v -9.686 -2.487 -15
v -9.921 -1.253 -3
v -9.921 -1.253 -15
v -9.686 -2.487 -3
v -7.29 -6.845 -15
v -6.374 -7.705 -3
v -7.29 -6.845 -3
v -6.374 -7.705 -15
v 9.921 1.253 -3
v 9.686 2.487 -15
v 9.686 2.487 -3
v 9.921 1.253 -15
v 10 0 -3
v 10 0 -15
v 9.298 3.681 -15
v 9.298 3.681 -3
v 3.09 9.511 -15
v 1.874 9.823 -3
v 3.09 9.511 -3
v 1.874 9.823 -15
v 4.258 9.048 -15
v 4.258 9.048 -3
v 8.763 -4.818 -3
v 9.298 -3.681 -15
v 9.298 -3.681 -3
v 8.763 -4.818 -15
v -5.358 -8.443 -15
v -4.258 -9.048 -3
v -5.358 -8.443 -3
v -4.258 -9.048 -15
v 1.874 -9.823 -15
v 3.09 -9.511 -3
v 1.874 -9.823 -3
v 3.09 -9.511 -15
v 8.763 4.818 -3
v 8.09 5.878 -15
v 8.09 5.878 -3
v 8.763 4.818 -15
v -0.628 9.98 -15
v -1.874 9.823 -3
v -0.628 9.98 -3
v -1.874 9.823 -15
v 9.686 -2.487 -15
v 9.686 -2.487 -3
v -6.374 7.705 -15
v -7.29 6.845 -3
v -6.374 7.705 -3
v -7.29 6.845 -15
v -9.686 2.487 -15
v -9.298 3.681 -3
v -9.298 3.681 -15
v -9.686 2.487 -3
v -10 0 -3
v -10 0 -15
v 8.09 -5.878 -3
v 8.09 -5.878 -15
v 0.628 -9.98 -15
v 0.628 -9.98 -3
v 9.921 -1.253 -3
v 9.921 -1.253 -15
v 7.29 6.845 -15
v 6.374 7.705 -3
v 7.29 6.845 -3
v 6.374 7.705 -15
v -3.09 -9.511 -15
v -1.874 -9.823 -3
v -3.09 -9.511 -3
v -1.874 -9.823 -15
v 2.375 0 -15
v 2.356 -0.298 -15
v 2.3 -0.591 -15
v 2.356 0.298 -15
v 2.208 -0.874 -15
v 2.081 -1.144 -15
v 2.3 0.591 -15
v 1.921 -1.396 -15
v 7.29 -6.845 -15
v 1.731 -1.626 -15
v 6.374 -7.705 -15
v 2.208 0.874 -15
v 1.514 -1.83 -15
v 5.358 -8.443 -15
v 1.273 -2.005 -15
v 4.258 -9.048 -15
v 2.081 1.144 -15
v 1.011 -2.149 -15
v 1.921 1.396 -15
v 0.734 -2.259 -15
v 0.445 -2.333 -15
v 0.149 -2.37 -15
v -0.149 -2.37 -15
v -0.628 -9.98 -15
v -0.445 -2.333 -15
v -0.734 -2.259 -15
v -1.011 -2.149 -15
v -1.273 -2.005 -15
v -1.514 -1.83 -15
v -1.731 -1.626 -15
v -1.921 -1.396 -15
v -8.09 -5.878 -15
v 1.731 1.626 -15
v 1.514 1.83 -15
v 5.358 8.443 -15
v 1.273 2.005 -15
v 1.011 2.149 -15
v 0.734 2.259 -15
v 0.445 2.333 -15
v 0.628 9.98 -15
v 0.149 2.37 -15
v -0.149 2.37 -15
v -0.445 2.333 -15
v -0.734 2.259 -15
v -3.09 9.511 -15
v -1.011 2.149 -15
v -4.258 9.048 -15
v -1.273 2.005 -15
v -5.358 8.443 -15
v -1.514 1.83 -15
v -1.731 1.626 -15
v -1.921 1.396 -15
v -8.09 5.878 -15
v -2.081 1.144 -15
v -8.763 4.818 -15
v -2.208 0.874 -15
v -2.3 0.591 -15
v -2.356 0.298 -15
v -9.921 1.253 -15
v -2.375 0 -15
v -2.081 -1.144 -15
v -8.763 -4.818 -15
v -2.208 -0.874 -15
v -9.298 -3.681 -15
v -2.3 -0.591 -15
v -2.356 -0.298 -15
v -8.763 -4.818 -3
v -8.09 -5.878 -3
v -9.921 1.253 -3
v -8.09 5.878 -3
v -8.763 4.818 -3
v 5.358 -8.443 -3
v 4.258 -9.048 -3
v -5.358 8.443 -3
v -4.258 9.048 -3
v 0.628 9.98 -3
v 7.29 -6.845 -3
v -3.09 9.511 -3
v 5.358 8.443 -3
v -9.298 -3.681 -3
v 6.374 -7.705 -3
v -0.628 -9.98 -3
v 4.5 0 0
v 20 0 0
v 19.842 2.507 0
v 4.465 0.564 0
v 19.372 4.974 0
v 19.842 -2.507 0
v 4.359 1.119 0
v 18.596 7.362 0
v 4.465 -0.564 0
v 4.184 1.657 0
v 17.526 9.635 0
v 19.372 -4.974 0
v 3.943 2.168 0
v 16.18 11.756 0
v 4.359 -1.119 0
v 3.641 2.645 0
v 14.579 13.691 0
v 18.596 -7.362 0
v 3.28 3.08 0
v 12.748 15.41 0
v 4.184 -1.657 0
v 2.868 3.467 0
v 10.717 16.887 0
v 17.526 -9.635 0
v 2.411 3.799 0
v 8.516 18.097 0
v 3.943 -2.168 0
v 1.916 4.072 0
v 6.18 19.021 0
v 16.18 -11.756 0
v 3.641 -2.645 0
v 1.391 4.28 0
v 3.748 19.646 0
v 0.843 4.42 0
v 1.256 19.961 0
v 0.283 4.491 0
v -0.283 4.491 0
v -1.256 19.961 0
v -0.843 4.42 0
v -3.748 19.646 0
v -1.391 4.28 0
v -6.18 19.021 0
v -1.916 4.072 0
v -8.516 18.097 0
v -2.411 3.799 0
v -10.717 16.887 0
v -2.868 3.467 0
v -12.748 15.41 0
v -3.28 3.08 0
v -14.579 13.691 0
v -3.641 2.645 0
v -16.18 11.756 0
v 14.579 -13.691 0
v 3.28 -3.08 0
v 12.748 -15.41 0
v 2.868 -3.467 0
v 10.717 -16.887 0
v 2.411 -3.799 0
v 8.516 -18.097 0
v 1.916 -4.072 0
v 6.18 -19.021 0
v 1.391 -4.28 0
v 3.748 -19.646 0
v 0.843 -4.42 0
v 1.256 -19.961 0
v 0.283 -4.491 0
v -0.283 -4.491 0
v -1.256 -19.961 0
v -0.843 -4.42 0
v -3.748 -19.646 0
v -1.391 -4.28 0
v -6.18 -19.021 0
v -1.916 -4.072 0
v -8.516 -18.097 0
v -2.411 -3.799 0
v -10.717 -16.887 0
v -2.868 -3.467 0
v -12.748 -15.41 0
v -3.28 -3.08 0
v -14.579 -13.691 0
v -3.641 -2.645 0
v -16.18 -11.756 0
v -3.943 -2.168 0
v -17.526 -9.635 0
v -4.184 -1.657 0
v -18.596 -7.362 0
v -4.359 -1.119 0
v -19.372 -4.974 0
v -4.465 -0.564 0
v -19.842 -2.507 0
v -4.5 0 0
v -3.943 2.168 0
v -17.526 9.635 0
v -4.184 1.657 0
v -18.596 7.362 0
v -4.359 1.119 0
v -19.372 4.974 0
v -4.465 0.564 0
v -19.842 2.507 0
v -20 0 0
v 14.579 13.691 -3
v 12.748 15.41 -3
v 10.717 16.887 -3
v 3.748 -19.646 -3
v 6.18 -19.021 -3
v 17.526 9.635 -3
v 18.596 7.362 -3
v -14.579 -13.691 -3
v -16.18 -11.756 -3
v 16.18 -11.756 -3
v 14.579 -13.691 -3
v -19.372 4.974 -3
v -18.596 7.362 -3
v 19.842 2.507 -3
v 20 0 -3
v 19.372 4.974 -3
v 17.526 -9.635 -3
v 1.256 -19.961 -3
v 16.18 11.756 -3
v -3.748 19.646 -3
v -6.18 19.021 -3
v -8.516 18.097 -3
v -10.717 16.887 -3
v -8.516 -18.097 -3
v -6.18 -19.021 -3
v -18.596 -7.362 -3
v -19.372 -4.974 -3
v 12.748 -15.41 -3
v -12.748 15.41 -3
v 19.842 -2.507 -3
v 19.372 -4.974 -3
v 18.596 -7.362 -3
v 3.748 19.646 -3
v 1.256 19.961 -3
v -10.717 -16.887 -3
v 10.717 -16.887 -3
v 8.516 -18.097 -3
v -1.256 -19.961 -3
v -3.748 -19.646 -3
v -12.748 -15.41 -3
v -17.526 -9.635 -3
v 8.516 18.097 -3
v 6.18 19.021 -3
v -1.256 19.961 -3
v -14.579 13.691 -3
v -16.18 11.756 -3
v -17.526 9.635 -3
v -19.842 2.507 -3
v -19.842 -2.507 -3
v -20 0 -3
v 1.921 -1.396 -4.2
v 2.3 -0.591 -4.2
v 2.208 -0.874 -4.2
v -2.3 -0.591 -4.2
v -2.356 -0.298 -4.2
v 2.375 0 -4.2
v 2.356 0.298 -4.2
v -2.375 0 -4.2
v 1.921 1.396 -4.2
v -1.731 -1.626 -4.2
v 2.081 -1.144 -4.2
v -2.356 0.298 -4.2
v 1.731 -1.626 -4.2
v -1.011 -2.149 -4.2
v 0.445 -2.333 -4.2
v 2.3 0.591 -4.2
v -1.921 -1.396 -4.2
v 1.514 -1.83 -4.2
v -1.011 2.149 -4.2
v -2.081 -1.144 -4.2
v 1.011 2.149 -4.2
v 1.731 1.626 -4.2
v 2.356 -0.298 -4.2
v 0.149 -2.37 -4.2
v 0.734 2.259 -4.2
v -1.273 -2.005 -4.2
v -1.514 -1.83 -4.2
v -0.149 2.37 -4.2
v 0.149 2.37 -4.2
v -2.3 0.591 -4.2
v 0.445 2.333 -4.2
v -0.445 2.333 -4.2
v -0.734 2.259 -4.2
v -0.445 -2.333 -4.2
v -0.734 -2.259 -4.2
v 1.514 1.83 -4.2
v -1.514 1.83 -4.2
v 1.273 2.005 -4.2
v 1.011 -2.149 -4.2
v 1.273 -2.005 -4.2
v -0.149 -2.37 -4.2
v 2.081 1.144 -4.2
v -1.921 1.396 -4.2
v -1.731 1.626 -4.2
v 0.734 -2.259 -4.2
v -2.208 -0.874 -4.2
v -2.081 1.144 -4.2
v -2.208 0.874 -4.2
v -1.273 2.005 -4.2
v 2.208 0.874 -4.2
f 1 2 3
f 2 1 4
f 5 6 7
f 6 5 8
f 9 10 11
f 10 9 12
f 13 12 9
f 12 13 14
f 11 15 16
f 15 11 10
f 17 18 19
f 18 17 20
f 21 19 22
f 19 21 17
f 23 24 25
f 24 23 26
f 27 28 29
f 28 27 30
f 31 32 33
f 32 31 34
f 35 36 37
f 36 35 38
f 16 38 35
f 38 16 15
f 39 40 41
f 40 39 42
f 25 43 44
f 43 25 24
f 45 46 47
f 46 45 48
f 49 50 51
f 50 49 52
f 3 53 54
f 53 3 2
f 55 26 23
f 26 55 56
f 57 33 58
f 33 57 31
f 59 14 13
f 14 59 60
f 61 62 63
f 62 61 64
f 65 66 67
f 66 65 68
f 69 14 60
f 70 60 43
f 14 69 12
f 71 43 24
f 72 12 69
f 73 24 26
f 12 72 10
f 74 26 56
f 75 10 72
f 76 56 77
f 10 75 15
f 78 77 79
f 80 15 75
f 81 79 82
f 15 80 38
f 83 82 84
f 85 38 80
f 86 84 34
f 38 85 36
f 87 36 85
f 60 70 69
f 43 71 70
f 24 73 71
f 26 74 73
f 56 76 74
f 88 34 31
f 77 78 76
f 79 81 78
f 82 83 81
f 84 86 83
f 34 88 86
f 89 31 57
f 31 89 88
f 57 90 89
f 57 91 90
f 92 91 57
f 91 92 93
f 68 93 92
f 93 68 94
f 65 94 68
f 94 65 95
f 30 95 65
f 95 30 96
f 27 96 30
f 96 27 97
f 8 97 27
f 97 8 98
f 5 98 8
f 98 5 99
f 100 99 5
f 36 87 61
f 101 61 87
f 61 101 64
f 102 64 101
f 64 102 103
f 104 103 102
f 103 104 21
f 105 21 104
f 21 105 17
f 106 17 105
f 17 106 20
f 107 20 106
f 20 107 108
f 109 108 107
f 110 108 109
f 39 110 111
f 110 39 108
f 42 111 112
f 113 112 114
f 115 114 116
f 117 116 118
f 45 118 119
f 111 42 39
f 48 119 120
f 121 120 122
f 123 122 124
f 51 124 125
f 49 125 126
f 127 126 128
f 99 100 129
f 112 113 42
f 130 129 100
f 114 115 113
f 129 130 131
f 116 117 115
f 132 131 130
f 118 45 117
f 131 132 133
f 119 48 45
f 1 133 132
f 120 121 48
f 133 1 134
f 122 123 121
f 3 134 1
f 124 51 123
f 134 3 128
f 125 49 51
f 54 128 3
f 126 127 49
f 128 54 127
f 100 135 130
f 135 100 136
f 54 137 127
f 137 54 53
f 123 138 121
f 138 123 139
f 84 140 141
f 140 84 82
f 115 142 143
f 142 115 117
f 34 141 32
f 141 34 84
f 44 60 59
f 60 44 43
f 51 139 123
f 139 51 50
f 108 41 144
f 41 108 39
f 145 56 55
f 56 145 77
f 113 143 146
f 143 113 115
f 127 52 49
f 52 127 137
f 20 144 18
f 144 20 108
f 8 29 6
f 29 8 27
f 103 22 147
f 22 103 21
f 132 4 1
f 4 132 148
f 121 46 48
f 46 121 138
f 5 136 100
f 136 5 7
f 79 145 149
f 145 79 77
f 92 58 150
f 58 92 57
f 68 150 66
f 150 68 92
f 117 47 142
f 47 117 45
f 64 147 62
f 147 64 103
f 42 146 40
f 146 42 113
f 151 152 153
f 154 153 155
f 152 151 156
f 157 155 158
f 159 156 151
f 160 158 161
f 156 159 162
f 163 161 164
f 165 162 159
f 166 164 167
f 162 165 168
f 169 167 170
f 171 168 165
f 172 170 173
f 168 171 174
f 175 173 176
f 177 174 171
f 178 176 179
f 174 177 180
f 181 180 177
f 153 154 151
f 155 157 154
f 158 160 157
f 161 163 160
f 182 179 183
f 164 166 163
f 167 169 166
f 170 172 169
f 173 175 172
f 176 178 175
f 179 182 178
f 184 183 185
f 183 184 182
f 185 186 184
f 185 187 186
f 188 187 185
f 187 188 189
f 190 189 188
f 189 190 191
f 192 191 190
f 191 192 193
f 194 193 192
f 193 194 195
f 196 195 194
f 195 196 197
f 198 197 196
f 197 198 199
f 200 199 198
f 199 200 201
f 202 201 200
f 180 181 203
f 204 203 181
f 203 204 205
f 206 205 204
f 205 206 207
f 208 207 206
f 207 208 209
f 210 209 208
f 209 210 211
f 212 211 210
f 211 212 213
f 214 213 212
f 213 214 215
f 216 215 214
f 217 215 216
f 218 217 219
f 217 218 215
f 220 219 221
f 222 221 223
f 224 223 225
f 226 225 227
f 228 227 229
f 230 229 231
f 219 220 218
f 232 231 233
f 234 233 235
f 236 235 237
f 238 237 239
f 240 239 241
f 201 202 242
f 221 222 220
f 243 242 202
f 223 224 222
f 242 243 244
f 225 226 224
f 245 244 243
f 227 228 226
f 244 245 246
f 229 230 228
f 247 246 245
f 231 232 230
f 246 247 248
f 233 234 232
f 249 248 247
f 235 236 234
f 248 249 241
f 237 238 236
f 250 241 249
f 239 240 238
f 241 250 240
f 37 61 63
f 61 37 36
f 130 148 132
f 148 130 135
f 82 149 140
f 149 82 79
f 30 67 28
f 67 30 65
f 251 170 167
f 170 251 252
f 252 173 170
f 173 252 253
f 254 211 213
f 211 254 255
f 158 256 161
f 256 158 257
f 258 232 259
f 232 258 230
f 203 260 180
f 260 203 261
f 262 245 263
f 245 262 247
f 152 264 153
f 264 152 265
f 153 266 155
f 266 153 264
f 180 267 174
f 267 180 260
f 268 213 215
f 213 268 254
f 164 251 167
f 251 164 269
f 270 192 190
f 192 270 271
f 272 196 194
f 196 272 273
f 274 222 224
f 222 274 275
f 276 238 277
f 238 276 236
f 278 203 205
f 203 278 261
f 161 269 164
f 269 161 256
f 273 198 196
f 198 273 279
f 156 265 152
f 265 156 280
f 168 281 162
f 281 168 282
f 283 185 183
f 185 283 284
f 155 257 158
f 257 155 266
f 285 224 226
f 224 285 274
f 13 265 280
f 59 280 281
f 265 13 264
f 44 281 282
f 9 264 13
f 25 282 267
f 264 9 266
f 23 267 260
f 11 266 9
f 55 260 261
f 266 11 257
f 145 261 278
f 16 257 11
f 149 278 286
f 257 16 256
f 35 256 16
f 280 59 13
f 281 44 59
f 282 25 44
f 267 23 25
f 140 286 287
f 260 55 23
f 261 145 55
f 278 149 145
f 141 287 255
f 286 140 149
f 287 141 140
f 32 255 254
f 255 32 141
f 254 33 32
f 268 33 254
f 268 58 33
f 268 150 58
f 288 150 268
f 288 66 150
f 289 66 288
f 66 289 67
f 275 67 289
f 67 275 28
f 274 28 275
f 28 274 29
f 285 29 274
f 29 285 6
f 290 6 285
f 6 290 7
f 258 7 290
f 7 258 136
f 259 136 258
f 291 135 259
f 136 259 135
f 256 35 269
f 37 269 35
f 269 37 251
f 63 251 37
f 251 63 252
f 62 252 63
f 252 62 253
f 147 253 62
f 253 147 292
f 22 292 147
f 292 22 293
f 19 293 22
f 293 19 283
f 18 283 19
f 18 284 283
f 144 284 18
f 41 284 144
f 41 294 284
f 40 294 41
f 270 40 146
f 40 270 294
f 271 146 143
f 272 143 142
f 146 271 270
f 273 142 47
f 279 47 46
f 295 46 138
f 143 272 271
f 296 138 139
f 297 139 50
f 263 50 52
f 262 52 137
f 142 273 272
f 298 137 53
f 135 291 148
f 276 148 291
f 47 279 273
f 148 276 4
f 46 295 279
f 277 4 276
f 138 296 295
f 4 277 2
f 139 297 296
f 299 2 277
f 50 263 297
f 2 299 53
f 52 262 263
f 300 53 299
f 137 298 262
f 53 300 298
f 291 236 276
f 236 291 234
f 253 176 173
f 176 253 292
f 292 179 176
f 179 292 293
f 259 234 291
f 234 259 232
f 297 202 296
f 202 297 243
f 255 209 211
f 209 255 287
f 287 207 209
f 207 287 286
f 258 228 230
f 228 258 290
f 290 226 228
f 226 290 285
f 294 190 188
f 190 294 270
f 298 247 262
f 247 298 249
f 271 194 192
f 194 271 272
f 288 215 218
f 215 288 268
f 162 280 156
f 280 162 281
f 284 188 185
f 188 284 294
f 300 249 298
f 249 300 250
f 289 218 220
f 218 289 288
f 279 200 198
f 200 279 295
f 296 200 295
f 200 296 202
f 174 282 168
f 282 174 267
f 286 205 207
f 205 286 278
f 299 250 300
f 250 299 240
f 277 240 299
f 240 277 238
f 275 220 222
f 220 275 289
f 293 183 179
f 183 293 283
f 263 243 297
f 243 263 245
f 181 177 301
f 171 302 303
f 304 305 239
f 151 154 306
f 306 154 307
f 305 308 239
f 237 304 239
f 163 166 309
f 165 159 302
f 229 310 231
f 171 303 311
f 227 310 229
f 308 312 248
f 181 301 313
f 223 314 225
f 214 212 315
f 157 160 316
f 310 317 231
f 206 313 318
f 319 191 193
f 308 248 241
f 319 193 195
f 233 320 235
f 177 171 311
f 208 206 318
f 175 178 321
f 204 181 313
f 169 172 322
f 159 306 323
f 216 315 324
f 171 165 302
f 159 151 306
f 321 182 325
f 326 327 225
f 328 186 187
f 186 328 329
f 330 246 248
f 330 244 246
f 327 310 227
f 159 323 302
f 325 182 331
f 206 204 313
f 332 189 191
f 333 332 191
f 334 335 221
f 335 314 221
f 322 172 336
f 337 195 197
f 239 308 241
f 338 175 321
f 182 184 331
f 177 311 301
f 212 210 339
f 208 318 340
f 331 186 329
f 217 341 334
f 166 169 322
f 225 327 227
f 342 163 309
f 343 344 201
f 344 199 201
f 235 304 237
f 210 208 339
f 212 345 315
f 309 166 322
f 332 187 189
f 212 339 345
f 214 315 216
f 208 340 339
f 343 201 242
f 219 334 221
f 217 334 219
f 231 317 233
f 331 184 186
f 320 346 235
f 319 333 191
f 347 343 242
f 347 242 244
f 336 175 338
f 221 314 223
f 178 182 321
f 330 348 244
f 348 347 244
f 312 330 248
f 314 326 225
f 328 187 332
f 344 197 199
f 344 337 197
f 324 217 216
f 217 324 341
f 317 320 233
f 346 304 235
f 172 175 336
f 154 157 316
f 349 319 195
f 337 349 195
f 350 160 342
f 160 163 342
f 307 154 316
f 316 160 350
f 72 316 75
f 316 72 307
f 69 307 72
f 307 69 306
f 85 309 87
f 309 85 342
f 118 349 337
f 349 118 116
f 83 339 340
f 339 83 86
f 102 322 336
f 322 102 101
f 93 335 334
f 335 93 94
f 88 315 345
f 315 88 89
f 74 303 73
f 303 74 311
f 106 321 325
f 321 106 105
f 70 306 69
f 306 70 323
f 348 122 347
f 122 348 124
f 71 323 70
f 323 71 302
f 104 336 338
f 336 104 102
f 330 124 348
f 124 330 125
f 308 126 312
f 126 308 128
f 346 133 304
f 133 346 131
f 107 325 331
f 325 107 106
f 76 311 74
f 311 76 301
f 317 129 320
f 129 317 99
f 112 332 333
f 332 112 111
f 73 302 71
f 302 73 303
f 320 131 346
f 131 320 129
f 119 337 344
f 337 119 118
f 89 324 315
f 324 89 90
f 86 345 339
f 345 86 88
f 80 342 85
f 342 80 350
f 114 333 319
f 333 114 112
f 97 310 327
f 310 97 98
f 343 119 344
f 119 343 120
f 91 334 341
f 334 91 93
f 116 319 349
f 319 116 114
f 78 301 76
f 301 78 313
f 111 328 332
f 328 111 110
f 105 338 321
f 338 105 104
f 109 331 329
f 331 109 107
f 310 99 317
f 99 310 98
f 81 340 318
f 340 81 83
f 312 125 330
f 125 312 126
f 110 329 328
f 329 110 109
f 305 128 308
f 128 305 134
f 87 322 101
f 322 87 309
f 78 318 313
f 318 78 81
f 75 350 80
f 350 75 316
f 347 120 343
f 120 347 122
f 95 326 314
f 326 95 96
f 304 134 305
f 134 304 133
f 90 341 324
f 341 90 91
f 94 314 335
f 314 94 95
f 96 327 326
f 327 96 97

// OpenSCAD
$fn = 50;


difference() {
	union() {
		translate(v = [0, 0, -15.0000000000]) {
			cylinder(h = 15, r = 10.0000000000);
		}
		translate(v = [0, 0, -3.0000000000]) {
			cylinder(h = 3, r = 20.0000000000);
		}
	}
	union() {
		translate(v = [0, 0, 0]) {
			rotate(a = [0, 0, 0]) {
				difference() {
					union() {
						#translate(v = [0, 0, -15.0000000000]) {
							cylinder(h = 15, r = 2.2500000000);
						}
						#translate(v = [0, 0, -4.2000000000]) {
							cylinder(h = 4.2000000000, r = 10.0000000000, r1 = 2.3750000000, r2 = 4.5000000000);
						}
						#translate(v = [0, 0, -15.0000000000]) {
							cylinder(h = 15, r = 2.3750000000);
						}
						#translate(v = [0, 0, -15.0000000000]) {
							cylinder(h = 15, r = 2.2500000000);
						}
					}
					union();
				}
			}
		}
	}
}
